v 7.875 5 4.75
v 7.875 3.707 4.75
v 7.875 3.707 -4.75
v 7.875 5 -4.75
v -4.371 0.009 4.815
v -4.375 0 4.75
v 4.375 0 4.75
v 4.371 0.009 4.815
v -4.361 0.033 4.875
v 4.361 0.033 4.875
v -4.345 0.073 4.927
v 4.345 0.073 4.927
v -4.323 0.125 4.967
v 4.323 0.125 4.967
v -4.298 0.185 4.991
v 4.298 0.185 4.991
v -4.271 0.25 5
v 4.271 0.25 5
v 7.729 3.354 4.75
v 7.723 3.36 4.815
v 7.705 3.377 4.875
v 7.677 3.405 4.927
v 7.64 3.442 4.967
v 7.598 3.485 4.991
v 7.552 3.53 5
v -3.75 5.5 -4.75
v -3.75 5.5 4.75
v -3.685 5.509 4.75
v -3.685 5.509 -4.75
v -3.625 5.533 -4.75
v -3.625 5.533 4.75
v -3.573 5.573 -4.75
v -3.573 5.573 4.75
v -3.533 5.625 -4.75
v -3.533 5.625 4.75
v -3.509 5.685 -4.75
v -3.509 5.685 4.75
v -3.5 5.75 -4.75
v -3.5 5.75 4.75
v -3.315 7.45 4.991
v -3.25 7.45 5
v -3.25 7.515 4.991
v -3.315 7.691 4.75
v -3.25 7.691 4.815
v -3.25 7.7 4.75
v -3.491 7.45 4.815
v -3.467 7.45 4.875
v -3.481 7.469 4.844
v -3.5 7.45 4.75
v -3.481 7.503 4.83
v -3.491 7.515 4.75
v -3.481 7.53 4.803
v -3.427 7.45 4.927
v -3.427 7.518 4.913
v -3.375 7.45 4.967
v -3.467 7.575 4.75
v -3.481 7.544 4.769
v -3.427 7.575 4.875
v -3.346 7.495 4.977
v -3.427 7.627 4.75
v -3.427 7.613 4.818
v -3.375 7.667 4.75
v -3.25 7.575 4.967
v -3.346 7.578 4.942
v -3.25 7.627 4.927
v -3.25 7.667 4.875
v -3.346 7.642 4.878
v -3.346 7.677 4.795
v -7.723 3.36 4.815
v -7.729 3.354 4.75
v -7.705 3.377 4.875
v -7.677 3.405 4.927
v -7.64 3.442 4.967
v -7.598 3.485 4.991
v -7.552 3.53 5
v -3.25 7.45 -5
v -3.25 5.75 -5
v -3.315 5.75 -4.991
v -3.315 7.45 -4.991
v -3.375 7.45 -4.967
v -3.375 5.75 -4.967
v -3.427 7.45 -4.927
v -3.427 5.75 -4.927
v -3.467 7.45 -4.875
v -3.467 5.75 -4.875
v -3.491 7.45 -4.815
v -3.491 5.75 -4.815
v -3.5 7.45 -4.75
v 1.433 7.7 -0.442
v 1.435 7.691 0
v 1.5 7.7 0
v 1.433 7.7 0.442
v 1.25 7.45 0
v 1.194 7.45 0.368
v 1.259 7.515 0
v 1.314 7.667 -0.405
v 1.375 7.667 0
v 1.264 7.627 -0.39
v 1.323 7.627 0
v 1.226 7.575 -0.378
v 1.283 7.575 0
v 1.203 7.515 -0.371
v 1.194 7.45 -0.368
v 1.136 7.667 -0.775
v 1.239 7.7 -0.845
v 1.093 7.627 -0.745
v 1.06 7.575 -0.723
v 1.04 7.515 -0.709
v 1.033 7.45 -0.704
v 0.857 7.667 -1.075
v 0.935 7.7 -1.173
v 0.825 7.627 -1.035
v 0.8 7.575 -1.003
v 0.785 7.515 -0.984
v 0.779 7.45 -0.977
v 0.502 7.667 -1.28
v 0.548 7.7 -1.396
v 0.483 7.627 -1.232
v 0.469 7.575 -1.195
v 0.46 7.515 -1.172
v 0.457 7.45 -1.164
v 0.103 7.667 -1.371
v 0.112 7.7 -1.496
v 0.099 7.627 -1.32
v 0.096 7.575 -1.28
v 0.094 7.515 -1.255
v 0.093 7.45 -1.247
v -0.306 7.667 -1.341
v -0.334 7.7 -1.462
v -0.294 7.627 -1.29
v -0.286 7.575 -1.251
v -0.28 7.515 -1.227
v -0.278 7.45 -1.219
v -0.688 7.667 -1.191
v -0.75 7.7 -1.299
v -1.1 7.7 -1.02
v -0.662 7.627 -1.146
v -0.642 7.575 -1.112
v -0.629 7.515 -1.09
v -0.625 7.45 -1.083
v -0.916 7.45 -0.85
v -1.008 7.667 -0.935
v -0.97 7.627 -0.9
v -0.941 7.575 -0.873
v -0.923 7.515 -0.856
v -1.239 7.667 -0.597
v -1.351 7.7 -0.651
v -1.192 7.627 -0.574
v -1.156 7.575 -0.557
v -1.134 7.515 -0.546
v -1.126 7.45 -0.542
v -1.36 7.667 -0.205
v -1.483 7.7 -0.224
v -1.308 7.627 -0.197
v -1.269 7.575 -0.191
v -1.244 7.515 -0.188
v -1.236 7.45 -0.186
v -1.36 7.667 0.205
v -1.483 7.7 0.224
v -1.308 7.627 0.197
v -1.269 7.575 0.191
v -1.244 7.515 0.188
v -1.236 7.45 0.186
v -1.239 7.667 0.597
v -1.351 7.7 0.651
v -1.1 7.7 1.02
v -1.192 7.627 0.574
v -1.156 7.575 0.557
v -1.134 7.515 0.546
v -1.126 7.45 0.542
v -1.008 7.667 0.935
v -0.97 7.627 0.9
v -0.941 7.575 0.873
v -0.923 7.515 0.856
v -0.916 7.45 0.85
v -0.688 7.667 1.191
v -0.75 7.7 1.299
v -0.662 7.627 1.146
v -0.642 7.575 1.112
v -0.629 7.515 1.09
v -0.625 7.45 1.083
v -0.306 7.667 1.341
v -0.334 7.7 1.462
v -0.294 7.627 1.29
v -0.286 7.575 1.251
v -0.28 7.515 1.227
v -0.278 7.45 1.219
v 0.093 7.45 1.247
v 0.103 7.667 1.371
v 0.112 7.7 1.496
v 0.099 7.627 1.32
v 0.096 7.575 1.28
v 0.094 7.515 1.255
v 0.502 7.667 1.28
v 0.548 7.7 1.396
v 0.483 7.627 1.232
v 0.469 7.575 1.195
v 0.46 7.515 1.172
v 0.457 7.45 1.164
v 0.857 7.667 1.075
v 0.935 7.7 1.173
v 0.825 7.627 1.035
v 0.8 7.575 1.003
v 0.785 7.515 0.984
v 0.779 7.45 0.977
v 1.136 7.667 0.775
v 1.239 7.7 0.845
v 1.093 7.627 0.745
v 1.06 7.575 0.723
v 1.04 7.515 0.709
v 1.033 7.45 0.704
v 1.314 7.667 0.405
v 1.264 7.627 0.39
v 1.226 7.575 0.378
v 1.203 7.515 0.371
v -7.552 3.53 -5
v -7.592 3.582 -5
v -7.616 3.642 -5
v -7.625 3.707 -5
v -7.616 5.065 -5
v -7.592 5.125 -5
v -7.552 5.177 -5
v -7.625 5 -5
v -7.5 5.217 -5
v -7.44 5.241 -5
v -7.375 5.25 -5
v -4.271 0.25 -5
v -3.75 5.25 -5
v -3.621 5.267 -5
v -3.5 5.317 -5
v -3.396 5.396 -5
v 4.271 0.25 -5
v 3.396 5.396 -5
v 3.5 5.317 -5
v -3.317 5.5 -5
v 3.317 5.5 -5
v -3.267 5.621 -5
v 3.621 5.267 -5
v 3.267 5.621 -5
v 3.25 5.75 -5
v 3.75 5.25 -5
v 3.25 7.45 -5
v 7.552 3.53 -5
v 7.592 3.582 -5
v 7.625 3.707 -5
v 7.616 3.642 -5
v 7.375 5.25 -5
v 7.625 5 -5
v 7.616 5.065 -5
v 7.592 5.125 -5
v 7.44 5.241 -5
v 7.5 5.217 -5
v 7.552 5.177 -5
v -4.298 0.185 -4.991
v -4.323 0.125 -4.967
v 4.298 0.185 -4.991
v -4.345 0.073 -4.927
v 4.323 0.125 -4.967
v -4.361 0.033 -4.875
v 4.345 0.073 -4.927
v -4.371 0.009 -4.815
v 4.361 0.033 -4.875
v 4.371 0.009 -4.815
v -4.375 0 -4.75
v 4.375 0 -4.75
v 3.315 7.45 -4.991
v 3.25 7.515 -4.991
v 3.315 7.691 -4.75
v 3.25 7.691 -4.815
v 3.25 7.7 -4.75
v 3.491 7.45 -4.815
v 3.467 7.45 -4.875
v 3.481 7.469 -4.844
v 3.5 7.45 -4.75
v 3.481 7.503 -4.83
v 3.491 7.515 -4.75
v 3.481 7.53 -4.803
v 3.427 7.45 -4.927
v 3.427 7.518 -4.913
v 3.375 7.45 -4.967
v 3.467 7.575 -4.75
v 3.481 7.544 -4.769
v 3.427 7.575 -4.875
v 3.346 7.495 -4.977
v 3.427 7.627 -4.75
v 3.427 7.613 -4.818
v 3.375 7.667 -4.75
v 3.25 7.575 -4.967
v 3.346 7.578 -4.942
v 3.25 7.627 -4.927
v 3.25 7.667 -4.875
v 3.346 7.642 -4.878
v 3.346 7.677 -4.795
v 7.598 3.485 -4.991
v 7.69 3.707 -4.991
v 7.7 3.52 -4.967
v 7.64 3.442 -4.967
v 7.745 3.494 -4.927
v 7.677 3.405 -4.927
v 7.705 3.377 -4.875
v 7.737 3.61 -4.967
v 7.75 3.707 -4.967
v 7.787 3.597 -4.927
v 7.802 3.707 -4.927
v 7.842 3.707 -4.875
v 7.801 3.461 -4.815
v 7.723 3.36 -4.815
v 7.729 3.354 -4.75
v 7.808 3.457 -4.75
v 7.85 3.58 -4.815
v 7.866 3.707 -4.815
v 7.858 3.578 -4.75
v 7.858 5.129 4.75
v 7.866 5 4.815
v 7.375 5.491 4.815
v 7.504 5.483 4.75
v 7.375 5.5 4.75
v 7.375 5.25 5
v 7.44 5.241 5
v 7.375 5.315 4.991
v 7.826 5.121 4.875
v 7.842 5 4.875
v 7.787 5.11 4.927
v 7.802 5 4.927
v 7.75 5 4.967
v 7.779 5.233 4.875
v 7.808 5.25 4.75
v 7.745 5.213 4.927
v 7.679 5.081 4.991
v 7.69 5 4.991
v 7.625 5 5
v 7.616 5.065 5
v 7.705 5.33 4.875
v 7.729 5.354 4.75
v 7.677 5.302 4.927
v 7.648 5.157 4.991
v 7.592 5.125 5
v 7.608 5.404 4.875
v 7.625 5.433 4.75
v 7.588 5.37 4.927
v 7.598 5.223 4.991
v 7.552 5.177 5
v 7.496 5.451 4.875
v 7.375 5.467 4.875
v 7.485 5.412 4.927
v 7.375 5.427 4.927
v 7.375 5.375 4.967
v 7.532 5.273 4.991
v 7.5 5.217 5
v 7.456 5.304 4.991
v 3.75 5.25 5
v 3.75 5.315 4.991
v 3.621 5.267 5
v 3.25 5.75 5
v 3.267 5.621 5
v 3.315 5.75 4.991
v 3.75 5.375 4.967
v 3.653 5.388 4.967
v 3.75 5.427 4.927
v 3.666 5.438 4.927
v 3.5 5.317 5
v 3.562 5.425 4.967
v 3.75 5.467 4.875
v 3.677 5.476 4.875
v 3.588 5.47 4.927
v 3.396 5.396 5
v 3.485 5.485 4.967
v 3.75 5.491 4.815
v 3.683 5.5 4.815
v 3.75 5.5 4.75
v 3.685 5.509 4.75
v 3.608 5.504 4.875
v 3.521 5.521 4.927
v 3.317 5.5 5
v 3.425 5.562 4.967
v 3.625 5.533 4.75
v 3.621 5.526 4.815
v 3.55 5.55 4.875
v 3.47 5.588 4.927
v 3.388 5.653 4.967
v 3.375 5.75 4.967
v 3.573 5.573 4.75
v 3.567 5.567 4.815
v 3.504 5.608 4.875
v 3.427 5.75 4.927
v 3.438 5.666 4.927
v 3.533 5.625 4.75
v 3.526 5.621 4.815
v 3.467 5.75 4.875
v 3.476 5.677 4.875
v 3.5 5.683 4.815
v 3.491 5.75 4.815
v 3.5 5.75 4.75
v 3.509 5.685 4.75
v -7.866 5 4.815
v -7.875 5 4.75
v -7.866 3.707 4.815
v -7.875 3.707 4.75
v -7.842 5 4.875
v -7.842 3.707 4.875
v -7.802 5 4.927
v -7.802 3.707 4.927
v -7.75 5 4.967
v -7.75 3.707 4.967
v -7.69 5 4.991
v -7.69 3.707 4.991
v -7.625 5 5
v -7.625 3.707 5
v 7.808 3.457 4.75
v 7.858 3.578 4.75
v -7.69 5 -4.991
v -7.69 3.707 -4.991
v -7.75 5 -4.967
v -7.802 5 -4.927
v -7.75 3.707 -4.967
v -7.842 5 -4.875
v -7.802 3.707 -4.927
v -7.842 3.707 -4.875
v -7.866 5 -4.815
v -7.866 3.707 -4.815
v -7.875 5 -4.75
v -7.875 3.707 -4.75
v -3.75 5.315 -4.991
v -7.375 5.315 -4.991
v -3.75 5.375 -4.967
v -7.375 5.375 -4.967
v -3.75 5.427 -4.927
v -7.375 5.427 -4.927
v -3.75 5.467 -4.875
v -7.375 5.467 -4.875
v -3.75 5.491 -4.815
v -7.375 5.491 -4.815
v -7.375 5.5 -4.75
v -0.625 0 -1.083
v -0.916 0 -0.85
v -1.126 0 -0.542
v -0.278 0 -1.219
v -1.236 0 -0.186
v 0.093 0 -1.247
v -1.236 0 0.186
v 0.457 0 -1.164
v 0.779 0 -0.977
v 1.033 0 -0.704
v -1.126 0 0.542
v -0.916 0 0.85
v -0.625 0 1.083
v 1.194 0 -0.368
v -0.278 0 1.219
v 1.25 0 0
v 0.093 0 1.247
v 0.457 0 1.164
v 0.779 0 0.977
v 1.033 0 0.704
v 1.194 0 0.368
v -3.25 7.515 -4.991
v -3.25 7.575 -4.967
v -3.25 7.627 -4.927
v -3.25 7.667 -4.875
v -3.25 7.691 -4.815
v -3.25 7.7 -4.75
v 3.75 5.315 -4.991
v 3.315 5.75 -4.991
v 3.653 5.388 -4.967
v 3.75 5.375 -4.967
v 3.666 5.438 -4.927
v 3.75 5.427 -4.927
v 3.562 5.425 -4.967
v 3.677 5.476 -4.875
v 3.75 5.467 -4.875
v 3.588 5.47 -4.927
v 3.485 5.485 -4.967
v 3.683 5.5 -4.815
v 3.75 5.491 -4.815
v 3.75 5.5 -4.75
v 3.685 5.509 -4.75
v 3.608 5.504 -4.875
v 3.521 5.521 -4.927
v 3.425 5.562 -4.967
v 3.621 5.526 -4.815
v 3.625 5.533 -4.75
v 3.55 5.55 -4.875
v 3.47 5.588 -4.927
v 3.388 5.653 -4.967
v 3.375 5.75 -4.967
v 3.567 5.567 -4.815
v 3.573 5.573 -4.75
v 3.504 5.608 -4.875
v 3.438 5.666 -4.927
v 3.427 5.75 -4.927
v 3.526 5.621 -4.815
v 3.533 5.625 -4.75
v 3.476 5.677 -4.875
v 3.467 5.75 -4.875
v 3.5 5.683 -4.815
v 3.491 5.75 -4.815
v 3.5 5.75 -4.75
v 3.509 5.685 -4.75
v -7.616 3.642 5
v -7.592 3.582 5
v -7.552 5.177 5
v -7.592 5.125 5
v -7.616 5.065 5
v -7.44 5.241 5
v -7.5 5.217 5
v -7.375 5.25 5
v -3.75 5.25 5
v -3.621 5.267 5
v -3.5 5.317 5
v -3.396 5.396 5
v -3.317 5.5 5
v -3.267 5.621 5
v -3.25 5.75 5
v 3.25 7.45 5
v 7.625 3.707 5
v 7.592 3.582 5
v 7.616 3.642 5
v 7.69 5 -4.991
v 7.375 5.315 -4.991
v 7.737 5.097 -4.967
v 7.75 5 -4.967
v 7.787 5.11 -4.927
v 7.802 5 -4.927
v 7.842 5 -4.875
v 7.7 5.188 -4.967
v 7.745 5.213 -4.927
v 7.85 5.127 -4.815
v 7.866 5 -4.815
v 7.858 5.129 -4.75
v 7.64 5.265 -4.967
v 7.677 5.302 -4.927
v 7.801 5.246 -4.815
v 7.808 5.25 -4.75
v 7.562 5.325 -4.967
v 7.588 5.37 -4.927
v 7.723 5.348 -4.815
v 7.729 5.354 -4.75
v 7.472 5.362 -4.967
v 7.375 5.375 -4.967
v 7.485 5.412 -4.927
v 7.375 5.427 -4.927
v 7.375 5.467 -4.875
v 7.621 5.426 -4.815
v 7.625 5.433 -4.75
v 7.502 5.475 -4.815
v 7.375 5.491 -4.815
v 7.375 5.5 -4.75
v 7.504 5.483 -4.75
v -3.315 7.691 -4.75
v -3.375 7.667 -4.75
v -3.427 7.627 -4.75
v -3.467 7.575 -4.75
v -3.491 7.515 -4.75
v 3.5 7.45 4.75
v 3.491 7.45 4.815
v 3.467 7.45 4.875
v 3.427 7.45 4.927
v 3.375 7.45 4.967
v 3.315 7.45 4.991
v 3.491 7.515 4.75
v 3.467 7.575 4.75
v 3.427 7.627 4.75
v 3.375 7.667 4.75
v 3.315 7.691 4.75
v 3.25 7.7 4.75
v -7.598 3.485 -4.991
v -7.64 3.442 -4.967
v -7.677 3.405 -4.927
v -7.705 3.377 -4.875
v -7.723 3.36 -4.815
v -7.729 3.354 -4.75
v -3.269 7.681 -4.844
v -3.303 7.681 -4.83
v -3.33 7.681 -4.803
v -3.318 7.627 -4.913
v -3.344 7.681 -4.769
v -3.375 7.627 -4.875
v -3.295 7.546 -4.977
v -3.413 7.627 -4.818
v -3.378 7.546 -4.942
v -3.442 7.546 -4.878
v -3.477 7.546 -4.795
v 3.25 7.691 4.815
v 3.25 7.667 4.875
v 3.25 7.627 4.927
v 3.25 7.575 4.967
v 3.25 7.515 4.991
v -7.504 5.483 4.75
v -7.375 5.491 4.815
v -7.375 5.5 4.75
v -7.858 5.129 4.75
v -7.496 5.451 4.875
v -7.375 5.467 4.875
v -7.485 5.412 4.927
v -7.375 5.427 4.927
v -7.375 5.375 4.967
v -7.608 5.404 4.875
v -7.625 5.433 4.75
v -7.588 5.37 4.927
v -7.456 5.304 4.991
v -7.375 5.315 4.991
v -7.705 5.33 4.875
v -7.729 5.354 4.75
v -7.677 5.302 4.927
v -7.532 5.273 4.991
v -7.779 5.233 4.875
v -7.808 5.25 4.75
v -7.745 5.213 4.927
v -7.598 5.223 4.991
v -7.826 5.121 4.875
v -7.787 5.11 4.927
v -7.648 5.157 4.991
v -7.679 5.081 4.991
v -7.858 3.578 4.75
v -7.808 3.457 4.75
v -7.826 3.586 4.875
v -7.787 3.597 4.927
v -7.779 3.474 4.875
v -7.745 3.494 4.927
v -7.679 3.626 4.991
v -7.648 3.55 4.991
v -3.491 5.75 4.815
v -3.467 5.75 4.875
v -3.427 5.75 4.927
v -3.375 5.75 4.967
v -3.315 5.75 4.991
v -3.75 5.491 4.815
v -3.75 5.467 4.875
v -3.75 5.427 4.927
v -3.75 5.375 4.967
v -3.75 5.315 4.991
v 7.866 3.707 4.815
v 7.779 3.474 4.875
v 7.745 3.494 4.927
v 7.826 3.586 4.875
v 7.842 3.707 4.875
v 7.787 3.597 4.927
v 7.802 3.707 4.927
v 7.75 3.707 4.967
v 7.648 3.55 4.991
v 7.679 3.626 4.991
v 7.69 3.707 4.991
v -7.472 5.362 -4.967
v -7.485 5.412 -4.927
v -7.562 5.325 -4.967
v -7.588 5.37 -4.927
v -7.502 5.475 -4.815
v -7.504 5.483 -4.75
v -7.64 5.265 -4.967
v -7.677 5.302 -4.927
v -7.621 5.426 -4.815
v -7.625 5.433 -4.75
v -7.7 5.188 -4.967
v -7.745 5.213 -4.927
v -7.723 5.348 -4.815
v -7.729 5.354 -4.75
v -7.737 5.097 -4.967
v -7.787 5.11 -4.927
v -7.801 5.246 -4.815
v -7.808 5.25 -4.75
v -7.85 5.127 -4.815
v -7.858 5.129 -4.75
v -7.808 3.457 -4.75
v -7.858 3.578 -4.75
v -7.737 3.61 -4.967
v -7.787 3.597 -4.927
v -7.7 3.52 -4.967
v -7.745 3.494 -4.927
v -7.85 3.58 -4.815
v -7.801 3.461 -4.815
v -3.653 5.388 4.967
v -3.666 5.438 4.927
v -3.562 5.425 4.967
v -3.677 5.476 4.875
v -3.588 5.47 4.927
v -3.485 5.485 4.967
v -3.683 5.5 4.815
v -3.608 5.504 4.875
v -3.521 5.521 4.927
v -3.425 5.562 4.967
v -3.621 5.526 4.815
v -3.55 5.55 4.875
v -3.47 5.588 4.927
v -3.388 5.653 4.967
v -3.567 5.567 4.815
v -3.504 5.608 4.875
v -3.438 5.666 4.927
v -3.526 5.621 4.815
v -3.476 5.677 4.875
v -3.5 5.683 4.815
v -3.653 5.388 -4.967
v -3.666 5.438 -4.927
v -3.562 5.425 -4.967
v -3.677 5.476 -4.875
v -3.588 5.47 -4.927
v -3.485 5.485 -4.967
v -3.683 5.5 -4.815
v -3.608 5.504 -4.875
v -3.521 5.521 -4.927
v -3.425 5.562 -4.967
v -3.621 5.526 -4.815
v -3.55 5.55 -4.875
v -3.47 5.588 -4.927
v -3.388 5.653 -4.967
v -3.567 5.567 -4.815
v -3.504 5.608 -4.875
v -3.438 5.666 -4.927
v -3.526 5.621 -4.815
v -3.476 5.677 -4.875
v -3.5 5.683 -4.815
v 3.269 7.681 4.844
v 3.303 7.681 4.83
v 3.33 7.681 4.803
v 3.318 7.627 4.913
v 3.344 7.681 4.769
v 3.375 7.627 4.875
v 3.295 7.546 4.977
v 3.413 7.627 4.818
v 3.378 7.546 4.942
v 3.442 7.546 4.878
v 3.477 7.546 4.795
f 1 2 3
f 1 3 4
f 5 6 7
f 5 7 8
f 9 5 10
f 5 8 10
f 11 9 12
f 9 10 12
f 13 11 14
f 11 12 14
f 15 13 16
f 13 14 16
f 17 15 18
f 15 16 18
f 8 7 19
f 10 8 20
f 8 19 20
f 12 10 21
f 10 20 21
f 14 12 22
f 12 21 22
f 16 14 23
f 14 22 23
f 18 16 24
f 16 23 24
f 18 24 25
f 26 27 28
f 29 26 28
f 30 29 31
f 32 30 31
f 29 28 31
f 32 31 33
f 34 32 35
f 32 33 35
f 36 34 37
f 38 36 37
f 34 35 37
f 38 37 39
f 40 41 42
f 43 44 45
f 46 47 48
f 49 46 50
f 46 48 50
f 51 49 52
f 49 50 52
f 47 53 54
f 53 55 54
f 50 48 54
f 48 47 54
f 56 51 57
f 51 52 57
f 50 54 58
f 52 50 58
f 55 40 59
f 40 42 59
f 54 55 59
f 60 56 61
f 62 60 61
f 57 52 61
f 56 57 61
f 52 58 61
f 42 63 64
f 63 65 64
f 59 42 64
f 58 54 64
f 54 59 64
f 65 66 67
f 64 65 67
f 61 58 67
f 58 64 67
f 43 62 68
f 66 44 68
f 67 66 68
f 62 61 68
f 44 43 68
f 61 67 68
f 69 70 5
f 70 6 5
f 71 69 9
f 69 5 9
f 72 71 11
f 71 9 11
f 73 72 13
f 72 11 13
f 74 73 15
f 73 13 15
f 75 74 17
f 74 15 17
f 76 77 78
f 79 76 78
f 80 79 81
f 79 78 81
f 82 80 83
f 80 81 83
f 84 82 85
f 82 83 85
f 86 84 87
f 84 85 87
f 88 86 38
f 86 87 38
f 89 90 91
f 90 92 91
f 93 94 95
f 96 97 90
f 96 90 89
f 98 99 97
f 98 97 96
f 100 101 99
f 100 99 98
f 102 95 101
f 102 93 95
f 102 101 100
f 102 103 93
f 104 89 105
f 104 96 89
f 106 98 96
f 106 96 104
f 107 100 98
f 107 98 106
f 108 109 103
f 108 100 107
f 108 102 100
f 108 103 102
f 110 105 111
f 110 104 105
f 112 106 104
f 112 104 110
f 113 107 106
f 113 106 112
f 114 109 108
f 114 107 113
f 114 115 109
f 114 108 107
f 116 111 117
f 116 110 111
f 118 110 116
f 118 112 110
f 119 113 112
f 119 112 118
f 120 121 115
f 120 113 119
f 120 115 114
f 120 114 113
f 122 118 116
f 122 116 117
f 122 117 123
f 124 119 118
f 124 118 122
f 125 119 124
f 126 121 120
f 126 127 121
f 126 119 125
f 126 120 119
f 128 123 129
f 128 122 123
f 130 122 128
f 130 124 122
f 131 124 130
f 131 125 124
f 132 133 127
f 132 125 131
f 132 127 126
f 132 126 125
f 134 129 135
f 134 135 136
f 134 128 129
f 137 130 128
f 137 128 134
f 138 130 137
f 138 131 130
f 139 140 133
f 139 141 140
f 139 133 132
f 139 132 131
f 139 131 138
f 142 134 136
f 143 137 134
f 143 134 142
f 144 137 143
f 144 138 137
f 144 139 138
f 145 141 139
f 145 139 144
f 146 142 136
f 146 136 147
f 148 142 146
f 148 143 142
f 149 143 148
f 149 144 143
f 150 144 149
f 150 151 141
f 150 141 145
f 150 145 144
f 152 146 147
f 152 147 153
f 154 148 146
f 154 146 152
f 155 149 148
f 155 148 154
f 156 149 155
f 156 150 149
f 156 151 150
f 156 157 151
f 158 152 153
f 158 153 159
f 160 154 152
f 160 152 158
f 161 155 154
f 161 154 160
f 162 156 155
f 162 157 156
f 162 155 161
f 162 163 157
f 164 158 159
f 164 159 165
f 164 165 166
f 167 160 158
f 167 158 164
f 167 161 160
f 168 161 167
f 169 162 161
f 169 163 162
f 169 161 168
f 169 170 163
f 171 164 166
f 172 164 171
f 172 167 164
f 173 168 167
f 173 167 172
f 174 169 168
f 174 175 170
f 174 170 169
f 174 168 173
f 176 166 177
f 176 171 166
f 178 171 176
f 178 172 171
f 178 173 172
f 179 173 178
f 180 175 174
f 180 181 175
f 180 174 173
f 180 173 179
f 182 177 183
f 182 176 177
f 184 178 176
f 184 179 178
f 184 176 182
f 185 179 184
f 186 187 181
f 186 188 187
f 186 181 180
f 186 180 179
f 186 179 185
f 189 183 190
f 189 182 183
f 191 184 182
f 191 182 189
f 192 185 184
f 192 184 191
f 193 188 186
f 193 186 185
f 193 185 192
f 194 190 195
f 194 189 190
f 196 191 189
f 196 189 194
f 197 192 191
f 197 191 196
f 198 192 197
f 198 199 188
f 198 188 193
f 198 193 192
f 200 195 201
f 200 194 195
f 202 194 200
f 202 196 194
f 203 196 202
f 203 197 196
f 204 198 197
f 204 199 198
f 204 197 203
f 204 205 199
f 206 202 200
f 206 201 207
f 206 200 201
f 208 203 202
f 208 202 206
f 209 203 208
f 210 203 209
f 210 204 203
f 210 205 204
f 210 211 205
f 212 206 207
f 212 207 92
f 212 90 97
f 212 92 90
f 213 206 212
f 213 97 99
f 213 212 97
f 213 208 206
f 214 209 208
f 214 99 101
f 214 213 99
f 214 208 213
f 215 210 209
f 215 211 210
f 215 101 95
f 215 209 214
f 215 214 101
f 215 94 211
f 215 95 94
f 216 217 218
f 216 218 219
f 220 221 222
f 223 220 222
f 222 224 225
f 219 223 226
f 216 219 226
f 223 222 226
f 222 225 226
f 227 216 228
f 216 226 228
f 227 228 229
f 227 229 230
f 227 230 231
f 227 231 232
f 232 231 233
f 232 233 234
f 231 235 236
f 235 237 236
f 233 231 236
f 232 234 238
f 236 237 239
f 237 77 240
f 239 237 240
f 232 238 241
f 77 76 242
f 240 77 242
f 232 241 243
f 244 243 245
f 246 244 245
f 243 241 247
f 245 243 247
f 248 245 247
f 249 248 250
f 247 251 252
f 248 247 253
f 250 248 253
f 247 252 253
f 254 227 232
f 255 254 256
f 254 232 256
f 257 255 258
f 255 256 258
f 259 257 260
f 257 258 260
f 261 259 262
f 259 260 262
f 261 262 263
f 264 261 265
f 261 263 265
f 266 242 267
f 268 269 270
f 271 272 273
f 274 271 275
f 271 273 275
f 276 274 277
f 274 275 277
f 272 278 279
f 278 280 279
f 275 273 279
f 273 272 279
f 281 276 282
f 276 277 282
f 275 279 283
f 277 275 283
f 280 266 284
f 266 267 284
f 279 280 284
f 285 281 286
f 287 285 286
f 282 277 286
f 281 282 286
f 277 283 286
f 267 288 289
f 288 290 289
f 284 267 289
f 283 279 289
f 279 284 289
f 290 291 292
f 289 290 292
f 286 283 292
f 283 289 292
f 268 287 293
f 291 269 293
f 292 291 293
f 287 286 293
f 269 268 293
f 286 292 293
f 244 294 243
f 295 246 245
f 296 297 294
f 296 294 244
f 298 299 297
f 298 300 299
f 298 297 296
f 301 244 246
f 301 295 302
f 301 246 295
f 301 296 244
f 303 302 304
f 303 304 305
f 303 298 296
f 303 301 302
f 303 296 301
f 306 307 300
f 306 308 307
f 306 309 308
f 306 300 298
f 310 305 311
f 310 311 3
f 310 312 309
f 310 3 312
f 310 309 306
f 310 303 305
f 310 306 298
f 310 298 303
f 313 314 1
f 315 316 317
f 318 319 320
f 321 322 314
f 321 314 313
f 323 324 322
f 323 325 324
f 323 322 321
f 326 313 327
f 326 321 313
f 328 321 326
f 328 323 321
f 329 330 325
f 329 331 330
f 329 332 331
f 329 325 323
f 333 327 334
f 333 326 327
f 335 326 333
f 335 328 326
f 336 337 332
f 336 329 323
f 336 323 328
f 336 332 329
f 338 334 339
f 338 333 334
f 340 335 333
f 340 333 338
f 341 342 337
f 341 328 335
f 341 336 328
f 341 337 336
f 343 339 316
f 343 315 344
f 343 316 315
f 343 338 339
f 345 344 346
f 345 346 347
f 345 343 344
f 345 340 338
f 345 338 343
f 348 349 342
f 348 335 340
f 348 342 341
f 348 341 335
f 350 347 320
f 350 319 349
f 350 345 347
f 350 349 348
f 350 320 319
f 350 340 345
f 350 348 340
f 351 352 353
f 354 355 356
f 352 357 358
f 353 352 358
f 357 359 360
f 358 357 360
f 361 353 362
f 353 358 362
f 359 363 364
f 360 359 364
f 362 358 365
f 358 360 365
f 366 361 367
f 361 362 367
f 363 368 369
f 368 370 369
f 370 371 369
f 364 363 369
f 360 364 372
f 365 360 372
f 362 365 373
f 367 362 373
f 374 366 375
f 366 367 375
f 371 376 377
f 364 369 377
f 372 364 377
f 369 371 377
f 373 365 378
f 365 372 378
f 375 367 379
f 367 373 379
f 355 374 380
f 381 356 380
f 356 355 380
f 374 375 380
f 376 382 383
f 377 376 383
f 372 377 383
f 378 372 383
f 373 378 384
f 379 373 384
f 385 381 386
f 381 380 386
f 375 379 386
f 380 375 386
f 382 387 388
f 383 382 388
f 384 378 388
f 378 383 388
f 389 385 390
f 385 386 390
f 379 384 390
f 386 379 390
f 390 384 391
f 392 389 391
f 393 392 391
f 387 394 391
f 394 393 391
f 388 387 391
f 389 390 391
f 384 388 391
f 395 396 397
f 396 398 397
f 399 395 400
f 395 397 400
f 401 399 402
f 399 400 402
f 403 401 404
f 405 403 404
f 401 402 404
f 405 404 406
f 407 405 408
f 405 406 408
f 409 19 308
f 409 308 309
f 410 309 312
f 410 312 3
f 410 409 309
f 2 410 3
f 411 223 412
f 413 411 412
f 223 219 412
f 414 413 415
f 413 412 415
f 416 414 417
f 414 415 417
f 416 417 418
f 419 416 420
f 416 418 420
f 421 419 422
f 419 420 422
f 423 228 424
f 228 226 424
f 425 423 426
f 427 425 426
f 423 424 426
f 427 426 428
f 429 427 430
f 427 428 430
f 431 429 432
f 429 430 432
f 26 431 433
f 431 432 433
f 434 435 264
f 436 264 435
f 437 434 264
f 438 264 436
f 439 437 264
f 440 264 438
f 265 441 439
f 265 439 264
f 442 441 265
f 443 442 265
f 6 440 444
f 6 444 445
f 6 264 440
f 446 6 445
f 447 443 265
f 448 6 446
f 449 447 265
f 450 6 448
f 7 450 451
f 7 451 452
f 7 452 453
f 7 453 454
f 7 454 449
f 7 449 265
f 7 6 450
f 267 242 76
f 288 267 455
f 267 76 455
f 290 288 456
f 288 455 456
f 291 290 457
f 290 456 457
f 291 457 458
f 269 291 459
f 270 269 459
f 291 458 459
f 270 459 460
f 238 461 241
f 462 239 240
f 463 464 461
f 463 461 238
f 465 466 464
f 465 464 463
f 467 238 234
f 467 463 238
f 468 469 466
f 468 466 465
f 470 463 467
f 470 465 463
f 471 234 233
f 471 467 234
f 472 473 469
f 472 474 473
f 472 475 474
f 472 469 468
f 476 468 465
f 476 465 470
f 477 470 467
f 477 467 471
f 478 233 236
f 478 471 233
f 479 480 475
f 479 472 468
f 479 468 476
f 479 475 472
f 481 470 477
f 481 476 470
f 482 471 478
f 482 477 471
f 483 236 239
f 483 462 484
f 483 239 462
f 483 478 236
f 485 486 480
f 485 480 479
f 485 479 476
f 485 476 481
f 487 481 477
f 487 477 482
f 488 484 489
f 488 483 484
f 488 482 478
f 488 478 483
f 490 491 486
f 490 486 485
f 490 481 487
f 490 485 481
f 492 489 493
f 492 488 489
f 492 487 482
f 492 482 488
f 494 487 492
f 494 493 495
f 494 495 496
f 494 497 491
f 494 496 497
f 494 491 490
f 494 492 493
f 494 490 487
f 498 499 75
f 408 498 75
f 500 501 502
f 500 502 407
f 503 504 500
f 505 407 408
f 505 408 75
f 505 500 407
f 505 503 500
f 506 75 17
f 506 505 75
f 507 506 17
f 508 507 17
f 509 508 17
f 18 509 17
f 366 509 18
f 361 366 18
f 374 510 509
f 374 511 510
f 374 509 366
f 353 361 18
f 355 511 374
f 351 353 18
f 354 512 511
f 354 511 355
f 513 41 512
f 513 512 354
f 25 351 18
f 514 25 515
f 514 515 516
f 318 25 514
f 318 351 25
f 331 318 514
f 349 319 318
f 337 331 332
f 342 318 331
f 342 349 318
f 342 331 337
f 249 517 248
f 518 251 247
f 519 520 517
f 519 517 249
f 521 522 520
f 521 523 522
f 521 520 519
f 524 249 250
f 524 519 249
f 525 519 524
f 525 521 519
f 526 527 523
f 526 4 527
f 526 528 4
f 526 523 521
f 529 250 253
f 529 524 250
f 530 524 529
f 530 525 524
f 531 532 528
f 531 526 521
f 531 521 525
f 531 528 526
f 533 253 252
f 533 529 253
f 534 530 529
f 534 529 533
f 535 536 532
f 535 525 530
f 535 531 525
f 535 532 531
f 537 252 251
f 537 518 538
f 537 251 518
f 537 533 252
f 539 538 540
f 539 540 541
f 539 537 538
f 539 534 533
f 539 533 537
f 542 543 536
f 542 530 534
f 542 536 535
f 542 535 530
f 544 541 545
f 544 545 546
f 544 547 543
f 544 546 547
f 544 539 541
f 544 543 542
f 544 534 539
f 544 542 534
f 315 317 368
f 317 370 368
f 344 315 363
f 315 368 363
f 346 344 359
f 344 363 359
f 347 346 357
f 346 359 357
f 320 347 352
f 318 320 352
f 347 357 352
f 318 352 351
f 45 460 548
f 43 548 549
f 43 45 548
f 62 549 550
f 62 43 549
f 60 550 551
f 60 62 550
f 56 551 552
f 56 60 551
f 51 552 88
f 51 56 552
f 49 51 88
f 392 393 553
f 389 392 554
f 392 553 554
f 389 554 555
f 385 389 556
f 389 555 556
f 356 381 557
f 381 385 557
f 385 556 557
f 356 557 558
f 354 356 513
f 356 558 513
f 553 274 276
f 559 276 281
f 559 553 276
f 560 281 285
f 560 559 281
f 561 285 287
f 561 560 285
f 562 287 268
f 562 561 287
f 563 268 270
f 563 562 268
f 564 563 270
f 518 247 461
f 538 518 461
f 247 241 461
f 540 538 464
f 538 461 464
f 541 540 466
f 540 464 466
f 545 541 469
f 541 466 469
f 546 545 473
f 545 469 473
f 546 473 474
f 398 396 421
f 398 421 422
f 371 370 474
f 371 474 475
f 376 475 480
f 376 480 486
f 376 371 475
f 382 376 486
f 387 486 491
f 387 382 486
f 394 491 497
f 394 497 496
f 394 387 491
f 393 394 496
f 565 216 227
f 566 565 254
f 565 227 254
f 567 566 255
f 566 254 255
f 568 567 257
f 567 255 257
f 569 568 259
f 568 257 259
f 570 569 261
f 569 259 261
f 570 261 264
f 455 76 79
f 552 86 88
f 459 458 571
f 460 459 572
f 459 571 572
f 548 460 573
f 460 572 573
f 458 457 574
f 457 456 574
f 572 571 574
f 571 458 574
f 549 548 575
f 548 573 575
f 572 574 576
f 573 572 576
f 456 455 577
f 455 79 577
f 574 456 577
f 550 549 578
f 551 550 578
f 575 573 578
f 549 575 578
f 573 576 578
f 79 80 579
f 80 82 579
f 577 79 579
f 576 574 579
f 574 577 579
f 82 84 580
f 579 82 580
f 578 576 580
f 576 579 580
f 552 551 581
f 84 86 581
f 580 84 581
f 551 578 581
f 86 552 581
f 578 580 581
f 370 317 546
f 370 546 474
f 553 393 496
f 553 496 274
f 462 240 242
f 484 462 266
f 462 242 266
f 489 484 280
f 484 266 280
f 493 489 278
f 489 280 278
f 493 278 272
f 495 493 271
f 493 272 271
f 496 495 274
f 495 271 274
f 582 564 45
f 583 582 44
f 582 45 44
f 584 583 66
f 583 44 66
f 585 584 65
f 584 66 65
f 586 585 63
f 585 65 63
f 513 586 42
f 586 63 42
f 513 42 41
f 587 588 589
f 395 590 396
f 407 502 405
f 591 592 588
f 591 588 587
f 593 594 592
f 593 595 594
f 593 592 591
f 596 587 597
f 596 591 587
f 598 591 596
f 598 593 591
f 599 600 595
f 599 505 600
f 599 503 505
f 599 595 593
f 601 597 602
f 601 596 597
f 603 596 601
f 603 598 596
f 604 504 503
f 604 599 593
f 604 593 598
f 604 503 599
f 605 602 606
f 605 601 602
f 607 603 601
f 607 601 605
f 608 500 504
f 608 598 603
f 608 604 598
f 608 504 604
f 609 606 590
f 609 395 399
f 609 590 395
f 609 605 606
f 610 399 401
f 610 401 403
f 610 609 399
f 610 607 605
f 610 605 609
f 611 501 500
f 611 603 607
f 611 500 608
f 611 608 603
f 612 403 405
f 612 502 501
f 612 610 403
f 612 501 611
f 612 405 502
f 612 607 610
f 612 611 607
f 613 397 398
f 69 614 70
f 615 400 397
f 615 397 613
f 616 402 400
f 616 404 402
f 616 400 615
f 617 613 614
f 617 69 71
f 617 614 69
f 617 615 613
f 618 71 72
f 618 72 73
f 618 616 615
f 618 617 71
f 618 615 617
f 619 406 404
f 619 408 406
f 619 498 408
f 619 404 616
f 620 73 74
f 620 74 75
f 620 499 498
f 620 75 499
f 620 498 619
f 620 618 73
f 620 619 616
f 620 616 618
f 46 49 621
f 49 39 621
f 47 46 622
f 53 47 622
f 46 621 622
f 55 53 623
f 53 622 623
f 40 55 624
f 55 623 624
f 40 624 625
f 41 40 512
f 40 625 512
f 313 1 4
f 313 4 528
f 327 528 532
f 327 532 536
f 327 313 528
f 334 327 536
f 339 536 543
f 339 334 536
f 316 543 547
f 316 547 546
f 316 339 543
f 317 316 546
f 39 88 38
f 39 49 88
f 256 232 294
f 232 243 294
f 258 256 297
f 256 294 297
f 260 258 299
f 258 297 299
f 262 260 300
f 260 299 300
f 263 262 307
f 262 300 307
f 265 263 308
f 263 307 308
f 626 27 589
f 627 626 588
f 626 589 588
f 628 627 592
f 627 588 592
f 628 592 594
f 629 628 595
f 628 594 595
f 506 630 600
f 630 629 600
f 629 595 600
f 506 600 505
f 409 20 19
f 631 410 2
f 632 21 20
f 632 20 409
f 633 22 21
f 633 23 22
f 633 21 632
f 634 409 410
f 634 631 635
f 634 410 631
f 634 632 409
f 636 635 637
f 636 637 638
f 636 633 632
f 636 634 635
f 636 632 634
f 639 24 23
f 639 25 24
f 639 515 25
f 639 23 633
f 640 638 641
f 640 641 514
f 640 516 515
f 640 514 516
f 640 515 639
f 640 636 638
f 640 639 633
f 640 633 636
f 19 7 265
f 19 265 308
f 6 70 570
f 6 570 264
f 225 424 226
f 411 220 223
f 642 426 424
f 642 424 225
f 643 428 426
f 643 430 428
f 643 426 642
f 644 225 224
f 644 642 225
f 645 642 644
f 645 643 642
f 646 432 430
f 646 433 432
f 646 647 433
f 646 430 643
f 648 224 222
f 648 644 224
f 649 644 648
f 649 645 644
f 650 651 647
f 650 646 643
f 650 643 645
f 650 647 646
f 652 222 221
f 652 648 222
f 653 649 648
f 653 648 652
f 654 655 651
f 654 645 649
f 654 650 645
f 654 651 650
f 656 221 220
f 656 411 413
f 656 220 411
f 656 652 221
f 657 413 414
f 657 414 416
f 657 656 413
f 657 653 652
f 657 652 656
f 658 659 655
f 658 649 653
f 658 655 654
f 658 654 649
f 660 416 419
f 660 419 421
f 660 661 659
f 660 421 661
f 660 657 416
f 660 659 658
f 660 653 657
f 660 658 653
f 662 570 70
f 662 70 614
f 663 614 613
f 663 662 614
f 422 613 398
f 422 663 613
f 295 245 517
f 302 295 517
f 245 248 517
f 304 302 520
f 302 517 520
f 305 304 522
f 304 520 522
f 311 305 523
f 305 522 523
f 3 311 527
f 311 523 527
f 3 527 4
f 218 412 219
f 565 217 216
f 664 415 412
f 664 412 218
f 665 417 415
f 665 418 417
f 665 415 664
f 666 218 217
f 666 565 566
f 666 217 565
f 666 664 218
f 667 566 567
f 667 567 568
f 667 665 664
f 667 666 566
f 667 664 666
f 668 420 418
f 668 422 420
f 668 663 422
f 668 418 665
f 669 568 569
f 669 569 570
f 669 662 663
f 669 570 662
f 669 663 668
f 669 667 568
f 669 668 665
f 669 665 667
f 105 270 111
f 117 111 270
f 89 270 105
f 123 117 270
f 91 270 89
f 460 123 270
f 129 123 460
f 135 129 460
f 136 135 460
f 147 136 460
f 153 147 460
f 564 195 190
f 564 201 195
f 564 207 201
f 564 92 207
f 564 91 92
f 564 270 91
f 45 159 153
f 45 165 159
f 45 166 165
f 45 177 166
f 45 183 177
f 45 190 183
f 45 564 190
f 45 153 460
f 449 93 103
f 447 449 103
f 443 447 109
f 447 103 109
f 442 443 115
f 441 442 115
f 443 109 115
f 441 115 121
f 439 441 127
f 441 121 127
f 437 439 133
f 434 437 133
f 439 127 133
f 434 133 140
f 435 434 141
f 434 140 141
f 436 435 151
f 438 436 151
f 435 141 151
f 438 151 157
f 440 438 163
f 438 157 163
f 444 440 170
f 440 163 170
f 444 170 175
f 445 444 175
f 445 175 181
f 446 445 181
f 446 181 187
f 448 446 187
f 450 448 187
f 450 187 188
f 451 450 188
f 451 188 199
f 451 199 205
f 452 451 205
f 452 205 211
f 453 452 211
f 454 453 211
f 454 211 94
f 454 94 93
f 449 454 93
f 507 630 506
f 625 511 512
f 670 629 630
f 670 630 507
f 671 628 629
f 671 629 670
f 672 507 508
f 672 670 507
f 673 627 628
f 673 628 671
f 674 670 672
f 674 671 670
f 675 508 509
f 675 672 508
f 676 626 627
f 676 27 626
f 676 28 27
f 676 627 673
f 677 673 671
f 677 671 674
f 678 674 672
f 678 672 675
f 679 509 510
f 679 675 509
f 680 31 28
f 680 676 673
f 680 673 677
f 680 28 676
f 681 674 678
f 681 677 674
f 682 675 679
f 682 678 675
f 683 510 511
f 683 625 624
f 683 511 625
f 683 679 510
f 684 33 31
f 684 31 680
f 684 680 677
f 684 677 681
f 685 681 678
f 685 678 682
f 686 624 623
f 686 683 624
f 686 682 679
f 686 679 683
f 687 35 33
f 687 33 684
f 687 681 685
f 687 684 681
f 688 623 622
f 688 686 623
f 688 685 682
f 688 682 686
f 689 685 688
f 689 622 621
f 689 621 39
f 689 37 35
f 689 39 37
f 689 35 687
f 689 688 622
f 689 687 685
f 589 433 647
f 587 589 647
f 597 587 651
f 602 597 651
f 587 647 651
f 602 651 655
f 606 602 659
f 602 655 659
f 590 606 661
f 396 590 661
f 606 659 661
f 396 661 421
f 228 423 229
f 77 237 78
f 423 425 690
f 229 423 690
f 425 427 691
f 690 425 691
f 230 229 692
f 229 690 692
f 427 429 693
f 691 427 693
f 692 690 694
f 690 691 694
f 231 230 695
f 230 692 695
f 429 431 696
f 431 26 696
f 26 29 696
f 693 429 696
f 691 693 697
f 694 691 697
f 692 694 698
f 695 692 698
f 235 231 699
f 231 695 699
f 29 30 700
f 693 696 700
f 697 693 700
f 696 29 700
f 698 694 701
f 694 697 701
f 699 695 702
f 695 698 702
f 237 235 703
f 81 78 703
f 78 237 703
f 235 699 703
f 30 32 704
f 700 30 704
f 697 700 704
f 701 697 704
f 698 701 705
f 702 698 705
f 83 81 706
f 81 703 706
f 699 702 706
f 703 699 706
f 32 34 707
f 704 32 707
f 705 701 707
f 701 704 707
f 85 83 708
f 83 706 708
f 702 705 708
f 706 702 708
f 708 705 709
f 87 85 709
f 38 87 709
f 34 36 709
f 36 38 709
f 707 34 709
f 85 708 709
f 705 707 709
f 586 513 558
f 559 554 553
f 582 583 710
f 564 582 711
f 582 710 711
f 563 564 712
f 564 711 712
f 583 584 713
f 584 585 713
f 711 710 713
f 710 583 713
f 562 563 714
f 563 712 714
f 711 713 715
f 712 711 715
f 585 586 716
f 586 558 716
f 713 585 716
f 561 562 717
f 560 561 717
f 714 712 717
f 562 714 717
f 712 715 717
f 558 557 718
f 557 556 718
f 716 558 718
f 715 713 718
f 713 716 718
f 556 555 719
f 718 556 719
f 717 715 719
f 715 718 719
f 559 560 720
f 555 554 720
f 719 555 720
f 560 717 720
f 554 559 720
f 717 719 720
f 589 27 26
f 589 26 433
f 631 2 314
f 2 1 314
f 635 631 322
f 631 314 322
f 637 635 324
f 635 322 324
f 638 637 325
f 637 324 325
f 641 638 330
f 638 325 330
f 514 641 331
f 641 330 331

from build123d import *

# Parameters (mm, degrees)
BOSS_EXTRUDE1_DEPTH = 5
SKETCH2_R           = 1.25
CUT_EXTRUDE1_DEPTH  = 8.7
FILLET1_R           = 0.5
FILLET2_R           = 0.25


with BuildPart() as part:
    # Sketch1 → Boss-Extrude1 (new body, symmetric)
    with BuildSketch(Plane.XY):
        Polygon((-4.375, 0), (4.375, 0), (7.875, 3.5), (7.875, 5.5), (3.5, 5.5), (3.5, 7.7), (-3.5, 7.7), (-3.5, 5.5), (-7.875, 5.5), (-7.875, 3.5), align=None)
    extrude(amount=BOSS_EXTRUDE1_DEPTH, both=True)

    # Sketch2 → Cut-Extrude1 (cut, through all)
    with BuildSketch(Plane(origin=(0, 7.7, 0), x_dir=(1, 0, 0), z_dir=(0, 1, 0))):
        Circle(SKETCH2_R)
    extrude(amount=-CUT_EXTRUDE1_DEPTH, mode=Mode.SUBTRACT)

    # Fillet1
    fillet1_edges = [part.edges().sort_by_distance(p)[0] for p in [
        (7.875, 3.5, 0),
        (-7.875, 3.5, 0),
        (-7.875, 5.5, 0),
        (7.875, 5.5, 0),
    ]]
    fillet(fillet1_edges, radius=FILLET1_R)

    # Fillet2
    fillet2_edges = [part.edges().sort_by_distance(p)[0] for p in [
        (3.5, 6.6, 5),
        (-5.4375, 5.5, -5),
        (-3.5, 6.6, -5),
        (0, 7.7, -5),
        (3.5, 6.6, -5),
        (0, 7.7, 5),
        (-3.5, 6.6, 5),
        (-3.5, 5.5, 0),
        (-3.5, 7.7, 0),
        (3.5, 7.7, 0),
        (3.5, 5.5, 0),
        (-5.4375, 5.5, 5),
        (0, 0, 5),
        (-1.25, 7.7, 0),
        (6.051776695, 1.676776695, 5),
        (7.875, 4.353553391, -5),
        (7.875, 4.353553391, 5),
        (-6.051776695, 1.676776695, -5),
        (-7.875, 4.353553391, -5),
        (5.4375, 5.5, -5),
        (-7.728553391, 5.353553391, -5),
        (-7.836939766, 3.515765065, -5),
        (7.728553391, 5.353553391, -5),
        (7.836939766, 3.515765065, -5),
        (5.4375, 5.5, 5),
        (-7.875, 4.353553391, 5),
        (-6.051776695, 1.676776695, 5),
        (-7.728553391, 5.353553391, 5),
        (-7.836939766, 3.515765065, 5),
        (7.728553391, 5.353553391, 5),
        (7.836939766, 3.515765065, 5),
        (6.051776695, 1.676776695, -5),
        (0, 0, -5),
    ]]
    fillet(fillet2_edges, radius=FILLET2_R)


solid = part.part
